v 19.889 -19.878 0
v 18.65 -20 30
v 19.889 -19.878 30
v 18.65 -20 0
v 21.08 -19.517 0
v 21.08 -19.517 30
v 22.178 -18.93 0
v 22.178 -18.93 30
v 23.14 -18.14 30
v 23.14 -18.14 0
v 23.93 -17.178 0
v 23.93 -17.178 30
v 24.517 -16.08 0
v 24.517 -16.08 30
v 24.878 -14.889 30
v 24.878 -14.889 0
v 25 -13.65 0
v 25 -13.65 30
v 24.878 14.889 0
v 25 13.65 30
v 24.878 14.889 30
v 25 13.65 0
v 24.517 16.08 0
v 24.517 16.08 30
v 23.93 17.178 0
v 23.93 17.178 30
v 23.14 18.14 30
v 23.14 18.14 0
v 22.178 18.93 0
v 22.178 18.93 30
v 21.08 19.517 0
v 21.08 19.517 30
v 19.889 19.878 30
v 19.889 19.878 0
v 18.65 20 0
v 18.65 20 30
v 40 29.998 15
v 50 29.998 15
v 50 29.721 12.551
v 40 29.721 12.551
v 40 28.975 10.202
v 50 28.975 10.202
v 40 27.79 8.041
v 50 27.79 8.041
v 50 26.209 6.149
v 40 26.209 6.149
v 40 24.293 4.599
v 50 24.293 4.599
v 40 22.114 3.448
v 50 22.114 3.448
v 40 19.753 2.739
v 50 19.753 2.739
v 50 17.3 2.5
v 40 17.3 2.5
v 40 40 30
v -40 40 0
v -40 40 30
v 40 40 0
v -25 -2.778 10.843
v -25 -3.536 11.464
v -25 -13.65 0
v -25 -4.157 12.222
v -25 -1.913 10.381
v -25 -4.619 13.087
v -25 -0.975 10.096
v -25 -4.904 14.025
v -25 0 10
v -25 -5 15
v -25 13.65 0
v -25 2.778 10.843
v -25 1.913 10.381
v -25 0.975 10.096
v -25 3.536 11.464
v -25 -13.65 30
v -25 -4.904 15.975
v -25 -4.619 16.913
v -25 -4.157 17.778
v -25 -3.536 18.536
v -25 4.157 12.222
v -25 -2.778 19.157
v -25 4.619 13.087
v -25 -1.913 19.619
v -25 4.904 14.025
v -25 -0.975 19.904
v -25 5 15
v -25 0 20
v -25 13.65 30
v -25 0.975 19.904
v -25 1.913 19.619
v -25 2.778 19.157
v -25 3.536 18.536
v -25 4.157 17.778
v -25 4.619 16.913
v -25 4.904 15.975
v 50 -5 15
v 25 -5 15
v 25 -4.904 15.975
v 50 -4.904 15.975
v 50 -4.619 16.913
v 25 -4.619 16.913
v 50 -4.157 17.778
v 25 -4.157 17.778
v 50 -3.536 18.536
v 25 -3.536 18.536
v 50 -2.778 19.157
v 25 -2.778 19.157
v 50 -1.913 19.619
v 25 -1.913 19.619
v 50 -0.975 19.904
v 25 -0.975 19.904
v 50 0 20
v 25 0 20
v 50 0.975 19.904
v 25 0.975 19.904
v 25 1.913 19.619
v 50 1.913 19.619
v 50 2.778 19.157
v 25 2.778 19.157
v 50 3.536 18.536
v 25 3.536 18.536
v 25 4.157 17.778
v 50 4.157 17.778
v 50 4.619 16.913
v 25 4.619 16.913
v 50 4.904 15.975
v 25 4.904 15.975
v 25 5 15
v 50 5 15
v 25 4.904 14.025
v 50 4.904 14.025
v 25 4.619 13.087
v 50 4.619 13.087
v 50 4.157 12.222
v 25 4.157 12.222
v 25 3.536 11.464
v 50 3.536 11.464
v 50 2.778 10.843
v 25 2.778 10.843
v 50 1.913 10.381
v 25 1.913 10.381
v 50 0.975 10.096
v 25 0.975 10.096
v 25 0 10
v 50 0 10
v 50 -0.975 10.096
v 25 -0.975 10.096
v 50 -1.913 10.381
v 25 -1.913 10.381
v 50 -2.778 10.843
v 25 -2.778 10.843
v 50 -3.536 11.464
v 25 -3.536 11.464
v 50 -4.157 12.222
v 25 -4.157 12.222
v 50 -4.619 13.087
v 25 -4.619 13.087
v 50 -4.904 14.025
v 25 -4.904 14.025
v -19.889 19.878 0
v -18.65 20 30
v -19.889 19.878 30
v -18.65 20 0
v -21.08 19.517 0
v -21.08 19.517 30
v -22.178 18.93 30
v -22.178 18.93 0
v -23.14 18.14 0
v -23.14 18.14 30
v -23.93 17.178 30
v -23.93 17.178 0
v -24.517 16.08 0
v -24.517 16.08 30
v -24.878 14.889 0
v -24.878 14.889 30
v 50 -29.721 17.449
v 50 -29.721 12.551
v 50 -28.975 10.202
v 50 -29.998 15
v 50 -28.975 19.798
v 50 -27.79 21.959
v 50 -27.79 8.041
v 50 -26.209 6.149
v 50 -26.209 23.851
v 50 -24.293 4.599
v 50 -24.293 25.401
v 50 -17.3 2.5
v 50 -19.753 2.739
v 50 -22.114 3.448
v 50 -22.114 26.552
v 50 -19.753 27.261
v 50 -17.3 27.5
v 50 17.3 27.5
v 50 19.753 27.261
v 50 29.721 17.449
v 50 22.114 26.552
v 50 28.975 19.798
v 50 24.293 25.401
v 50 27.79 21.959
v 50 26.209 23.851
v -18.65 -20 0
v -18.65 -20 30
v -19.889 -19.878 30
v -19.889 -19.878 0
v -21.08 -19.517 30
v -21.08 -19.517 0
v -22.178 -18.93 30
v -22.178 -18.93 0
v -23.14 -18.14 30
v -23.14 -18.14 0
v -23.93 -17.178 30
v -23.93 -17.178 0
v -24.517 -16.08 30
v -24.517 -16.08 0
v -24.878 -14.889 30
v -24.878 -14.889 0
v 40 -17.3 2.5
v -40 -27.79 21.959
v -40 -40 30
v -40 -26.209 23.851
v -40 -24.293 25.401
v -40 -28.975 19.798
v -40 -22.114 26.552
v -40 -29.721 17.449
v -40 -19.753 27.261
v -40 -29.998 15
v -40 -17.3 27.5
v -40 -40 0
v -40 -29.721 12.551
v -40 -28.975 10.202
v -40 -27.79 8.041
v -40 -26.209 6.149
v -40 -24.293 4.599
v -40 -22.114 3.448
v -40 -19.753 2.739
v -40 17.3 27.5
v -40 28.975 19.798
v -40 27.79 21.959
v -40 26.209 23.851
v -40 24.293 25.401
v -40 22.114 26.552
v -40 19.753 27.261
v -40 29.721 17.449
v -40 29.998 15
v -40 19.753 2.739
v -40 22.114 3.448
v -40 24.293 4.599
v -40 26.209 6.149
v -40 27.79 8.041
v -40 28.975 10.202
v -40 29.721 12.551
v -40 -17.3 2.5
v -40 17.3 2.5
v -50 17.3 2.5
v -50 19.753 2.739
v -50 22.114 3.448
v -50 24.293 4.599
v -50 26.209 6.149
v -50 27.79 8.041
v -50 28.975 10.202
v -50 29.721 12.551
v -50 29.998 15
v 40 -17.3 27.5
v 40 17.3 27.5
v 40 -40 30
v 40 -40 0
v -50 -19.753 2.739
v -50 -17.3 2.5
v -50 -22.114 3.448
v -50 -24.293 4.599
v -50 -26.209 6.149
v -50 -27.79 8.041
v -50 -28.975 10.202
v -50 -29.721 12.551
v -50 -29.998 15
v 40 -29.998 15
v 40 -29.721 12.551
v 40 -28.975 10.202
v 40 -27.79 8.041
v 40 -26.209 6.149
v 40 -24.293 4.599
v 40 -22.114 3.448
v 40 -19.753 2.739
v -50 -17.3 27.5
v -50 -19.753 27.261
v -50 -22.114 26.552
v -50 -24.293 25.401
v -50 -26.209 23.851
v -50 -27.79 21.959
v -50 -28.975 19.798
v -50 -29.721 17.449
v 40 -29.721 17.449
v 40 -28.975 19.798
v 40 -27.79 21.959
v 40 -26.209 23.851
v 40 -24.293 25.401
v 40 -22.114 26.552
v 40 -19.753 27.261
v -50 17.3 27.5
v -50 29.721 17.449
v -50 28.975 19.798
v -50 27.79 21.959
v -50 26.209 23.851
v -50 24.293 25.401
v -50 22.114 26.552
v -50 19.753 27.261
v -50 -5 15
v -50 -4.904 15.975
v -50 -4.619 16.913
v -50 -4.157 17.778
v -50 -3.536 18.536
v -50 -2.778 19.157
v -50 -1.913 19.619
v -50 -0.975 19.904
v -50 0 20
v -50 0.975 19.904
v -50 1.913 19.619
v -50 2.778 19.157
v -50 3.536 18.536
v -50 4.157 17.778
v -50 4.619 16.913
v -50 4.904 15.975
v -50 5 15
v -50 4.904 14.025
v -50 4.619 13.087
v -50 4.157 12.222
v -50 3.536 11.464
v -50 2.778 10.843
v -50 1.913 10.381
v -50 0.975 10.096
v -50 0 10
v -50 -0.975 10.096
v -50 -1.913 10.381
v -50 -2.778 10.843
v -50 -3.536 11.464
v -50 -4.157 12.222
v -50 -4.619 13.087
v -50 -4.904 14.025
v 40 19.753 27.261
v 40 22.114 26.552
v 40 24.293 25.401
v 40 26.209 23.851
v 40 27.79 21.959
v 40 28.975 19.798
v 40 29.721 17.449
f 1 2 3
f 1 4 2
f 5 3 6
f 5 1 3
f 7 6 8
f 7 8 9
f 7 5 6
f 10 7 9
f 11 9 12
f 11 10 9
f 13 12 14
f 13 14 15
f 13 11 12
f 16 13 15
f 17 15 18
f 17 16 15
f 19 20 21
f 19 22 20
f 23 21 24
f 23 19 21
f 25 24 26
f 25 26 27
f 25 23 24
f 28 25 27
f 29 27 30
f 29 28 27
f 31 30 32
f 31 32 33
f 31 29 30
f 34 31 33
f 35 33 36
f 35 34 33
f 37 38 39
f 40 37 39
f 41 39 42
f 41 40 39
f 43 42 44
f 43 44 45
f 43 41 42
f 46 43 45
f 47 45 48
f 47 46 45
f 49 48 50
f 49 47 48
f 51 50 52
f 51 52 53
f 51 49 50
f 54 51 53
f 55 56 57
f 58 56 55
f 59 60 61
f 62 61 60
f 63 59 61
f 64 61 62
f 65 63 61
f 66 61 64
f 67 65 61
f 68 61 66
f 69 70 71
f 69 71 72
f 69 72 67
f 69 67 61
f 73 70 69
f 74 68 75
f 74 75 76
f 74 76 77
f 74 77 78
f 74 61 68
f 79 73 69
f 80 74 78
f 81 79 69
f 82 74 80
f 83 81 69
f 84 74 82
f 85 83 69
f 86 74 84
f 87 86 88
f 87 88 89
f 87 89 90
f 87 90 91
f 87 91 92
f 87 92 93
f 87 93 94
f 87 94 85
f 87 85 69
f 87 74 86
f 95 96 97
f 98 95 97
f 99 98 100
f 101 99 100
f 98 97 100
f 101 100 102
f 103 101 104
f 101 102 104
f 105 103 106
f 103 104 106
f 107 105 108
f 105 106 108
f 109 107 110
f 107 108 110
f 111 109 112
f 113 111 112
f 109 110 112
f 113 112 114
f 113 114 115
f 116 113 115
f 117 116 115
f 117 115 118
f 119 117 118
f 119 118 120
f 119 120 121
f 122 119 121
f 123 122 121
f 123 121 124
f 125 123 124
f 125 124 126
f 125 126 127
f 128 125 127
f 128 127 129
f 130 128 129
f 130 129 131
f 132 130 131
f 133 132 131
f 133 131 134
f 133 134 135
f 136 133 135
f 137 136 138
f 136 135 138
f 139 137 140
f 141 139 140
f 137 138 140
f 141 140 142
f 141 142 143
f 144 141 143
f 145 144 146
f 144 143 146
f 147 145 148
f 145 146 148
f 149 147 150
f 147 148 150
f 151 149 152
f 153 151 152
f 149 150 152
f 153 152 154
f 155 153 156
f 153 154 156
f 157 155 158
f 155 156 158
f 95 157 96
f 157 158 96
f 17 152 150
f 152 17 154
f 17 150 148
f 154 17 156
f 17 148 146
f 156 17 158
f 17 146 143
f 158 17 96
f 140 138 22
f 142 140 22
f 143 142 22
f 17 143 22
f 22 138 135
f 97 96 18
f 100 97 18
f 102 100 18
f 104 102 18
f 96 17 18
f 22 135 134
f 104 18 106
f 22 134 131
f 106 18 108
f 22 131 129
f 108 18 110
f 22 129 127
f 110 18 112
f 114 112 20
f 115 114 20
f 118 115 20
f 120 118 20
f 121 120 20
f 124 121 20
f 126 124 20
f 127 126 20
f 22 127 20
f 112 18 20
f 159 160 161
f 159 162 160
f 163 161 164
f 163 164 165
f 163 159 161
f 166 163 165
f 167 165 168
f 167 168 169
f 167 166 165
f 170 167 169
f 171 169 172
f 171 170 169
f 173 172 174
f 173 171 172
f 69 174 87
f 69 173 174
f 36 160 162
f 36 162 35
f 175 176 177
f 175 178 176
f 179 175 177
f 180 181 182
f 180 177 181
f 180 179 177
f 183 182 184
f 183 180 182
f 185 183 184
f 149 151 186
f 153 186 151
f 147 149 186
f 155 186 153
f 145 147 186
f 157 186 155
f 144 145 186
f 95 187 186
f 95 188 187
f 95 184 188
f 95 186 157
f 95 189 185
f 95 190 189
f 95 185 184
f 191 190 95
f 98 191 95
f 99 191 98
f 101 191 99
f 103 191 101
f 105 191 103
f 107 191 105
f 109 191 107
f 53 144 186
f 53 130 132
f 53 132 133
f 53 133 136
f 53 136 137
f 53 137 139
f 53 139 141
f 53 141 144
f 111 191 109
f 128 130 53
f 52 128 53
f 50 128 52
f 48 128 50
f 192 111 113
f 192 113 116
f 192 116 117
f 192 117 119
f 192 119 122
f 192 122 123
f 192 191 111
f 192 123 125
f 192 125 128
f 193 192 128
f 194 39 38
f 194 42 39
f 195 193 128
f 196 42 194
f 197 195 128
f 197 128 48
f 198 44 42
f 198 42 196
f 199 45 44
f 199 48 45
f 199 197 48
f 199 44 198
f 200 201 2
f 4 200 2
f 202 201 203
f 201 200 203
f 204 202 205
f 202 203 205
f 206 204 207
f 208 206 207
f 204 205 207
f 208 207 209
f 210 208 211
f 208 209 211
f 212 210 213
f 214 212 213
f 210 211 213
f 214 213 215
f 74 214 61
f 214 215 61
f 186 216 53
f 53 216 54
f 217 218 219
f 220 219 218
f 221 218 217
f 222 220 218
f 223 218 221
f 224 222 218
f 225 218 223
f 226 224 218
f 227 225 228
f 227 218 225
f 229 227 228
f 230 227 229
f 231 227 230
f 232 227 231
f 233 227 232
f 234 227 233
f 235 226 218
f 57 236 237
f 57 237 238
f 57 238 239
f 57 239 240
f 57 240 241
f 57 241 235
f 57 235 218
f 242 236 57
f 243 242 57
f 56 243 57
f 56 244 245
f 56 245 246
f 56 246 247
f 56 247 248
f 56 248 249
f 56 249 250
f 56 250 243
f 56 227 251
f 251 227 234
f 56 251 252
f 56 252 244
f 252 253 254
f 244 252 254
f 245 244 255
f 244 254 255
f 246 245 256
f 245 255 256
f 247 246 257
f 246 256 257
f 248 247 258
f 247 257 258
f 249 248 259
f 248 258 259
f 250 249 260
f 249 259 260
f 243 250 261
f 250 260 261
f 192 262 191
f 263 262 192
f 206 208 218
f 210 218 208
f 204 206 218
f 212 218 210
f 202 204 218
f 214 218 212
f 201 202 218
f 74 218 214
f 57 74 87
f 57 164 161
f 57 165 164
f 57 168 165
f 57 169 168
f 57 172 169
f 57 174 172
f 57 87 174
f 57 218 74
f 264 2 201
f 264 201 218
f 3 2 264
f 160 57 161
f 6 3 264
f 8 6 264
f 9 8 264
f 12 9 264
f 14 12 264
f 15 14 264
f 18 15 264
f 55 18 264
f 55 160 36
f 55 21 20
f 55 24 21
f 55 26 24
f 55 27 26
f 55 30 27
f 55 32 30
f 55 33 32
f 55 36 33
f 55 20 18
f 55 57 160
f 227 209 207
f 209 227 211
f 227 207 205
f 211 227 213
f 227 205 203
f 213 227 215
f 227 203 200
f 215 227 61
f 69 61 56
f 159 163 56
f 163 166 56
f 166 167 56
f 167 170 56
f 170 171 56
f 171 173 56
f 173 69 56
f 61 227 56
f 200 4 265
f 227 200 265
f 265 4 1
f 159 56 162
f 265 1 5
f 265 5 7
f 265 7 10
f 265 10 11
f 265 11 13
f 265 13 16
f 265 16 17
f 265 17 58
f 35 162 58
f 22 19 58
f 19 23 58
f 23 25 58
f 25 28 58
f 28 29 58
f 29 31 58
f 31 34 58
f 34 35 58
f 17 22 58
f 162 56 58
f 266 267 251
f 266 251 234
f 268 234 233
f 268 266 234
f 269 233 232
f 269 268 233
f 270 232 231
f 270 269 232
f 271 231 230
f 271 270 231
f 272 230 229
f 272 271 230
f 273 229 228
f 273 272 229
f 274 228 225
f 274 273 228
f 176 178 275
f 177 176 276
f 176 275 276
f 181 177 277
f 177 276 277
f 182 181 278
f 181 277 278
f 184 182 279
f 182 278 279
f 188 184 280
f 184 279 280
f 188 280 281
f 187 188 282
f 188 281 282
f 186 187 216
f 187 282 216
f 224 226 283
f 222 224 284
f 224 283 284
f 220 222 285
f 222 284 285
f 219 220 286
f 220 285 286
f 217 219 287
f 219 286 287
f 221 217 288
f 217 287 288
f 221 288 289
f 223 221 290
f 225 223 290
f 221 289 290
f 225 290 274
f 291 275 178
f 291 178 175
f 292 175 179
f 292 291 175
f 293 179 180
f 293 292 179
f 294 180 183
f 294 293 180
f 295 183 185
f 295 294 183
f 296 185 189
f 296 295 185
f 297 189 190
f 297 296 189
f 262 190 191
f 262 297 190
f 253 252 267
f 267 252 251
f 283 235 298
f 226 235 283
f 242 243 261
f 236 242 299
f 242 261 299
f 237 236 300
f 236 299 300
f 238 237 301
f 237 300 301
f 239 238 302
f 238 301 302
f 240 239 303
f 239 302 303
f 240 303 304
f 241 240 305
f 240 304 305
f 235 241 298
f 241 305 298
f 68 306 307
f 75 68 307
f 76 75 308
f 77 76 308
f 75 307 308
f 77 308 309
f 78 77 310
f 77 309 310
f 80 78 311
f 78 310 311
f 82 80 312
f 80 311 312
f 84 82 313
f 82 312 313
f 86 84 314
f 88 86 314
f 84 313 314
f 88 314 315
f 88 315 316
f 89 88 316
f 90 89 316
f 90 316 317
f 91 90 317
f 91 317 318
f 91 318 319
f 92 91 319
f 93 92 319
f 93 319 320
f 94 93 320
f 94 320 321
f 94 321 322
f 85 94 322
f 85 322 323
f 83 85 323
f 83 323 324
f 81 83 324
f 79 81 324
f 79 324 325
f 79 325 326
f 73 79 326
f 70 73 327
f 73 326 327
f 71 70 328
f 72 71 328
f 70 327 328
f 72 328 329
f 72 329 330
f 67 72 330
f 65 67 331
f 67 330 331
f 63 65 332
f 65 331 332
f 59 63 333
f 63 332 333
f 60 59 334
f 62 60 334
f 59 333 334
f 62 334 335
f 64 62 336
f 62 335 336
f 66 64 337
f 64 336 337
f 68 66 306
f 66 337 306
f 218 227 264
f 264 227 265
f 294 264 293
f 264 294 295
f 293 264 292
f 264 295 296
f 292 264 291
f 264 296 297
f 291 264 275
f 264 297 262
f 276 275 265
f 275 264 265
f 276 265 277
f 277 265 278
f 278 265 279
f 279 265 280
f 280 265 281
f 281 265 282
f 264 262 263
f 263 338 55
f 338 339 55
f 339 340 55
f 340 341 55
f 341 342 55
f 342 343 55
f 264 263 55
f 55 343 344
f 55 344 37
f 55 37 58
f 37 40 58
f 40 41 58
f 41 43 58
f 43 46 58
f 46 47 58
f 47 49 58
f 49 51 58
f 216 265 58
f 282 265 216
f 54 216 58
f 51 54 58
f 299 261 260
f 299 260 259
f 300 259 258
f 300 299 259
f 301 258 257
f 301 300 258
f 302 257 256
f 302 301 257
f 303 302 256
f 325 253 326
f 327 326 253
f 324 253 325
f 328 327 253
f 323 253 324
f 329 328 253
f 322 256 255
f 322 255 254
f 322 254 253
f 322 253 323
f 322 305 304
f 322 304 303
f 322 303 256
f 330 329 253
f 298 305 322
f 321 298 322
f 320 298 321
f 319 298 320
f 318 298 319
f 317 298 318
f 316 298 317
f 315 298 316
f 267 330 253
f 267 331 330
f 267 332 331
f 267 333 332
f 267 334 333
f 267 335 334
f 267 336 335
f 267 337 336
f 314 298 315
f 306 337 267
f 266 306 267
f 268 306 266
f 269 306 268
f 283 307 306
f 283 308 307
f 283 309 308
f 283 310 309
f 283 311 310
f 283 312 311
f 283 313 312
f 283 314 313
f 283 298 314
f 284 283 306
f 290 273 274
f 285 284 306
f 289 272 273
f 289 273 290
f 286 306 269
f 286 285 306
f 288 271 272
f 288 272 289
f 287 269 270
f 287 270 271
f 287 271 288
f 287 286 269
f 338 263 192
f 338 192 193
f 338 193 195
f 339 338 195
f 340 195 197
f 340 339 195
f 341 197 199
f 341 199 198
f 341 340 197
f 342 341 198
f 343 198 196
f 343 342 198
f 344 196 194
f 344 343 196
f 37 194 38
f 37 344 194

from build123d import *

# Parameters (mm, degrees)
F0_W         = 80
F0_H         = 80
F1_DEPTH     = 30
F2_W         = 60
F2_H         = 25
F3_DEPTH     = 10
F4_W         = 60
F4_H         = 25
F5_DEPTH     = 10
F6_R         = 5
F7_DEPTH     = 100.001
F8_W         = 50
F8_H         = 40
F9_DEPTH     = 30.001
F10_R        = 6.35
F11_T1_DEPTH = 41.75
F11_T3_DEPTH = 41.75


# Not quite as in the source:
# - a fillet or chamfer that OpenCascade refuses, or shapes differently, is made with other operations: its cross-section is extruded or revolved along the edge and cut away or added


with BuildPart() as f1:
    # F0 (on Top) → F1 (new body)
    with BuildSketch(Plane.XY):
        Rectangle(F0_W, F0_H)
    extrude(amount=F1_DEPTH)

    # F2 (on face) → F3 (join)
    with BuildSketch(Plane(origin=(-40, 0, 0), x_dir=(0, -1, 0), z_dir=(-1, 0, 0))):
        with Locations((0, 15)):
            Rectangle(F2_W, F2_H)
    extrude(amount=F3_DEPTH)

    # F4 (on face) → F5 (join)
    with BuildSketch(Plane.YZ.offset(40)):
        with Locations((0, 15)):
            Rectangle(F4_W, F4_H)
    extrude(amount=F5_DEPTH)

    # F6 (on face) → F7 (cut, through all)
    with BuildSketch(Plane(origin=(-50, 0, 0), x_dir=(0, -1, 0), z_dir=(-1, 0, 0))):
        with Locations((0, 15)):
            Circle(F6_R)
    extrude(amount=-F7_DEPTH, mode=Mode.SUBTRACT)

    # F8 (on face) → F9 (cut, through all)
    with BuildSketch(Plane.XY.offset(30)):
        Rectangle(F8_W, F8_H)
    extrude(amount=-F9_DEPTH, mode=Mode.SUBTRACT)

    # F10
    f10_edges = [f1.edges().sort_by_distance(p)[0] for p in [
        (-25, 20, 15),
        (25, 20, 15),
        (25, -20, 15),
        (-25, -20, 15),
    ]]
    fillet(f10_edges, radius=F10_R)

    # F11: fillet of radius 12.7 on 8 edges, made by hand

    # F11_s2 → F11_t1 (cut)
    with BuildSketch(Plane.YZ.offset(40)):
        with BuildLine():
            ThreePointArc((-30, 14.8), (-26.2802561211, 23.7802561211), (-17.3, 27.5))
            Line((-17.3, 27.5), (-30, 27.5))
            Line((-30, 27.5), (-30, 14.8))
        make_face()
        with BuildLine():
            ThreePointArc((-30, 15.2), (-26.2802561211, 6.2197438789), (-17.3, 2.5))
            Line((-17.3, 2.5), (-30, 2.5))
            Line((-30, 2.5), (-30, 15.2))
        make_face()
        with BuildLine():
            ThreePointArc((30, 15.2), (26.2802561211, 6.2197438789), (17.3, 2.5))
            Line((17.3, 2.5), (30, 2.5))
            Line((30, 2.5), (30, 15.2))
        make_face()
        with BuildLine():
            ThreePointArc((17.3, 27.5), (26.2802561211, 23.7802561211), (30, 14.8))
            Line((30, 14.8), (30, 27.5))
            Line((30, 27.5), (17.3, 27.5))
        make_face()
    extrude(amount=F11_T1_DEPTH, mode=Mode.SUBTRACT)

    # F11_s4 → F11_t3 (cut)
    with BuildSketch(Plane.YZ.offset(-81.75)):
        with BuildLine():
            ThreePointArc((17.3, 2.5), (26.2802561211, 6.2197438789), (30, 15.2))
            Line((30, 15.2), (30, 2.5))
            Line((30, 2.5), (17.3, 2.5))
        make_face()
        with BuildLine():
            ThreePointArc((-17.3, 2.5), (-26.2802561211, 6.2197438789), (-30, 15.2))
            Line((-30, 15.2), (-30, 2.5))
            Line((-30, 2.5), (-17.3, 2.5))
        make_face()
        with BuildLine():
            ThreePointArc((-17.3, 27.5), (-26.2802561211, 23.7802561211), (-30, 14.8))
            Line((-30, 14.8), (-30, 27.5))
            Line((-30, 27.5), (-17.3, 27.5))
        make_face()
        with BuildLine():
            ThreePointArc((30, 14.8), (26.2802561211, 23.7802561211), (17.3, 27.5))
            Line((17.3, 27.5), (30, 27.5))
            Line((30, 27.5), (30, 14.8))
        make_face()
    extrude(amount=F11_T3_DEPTH, mode=Mode.SUBTRACT)


solid = f1.part
